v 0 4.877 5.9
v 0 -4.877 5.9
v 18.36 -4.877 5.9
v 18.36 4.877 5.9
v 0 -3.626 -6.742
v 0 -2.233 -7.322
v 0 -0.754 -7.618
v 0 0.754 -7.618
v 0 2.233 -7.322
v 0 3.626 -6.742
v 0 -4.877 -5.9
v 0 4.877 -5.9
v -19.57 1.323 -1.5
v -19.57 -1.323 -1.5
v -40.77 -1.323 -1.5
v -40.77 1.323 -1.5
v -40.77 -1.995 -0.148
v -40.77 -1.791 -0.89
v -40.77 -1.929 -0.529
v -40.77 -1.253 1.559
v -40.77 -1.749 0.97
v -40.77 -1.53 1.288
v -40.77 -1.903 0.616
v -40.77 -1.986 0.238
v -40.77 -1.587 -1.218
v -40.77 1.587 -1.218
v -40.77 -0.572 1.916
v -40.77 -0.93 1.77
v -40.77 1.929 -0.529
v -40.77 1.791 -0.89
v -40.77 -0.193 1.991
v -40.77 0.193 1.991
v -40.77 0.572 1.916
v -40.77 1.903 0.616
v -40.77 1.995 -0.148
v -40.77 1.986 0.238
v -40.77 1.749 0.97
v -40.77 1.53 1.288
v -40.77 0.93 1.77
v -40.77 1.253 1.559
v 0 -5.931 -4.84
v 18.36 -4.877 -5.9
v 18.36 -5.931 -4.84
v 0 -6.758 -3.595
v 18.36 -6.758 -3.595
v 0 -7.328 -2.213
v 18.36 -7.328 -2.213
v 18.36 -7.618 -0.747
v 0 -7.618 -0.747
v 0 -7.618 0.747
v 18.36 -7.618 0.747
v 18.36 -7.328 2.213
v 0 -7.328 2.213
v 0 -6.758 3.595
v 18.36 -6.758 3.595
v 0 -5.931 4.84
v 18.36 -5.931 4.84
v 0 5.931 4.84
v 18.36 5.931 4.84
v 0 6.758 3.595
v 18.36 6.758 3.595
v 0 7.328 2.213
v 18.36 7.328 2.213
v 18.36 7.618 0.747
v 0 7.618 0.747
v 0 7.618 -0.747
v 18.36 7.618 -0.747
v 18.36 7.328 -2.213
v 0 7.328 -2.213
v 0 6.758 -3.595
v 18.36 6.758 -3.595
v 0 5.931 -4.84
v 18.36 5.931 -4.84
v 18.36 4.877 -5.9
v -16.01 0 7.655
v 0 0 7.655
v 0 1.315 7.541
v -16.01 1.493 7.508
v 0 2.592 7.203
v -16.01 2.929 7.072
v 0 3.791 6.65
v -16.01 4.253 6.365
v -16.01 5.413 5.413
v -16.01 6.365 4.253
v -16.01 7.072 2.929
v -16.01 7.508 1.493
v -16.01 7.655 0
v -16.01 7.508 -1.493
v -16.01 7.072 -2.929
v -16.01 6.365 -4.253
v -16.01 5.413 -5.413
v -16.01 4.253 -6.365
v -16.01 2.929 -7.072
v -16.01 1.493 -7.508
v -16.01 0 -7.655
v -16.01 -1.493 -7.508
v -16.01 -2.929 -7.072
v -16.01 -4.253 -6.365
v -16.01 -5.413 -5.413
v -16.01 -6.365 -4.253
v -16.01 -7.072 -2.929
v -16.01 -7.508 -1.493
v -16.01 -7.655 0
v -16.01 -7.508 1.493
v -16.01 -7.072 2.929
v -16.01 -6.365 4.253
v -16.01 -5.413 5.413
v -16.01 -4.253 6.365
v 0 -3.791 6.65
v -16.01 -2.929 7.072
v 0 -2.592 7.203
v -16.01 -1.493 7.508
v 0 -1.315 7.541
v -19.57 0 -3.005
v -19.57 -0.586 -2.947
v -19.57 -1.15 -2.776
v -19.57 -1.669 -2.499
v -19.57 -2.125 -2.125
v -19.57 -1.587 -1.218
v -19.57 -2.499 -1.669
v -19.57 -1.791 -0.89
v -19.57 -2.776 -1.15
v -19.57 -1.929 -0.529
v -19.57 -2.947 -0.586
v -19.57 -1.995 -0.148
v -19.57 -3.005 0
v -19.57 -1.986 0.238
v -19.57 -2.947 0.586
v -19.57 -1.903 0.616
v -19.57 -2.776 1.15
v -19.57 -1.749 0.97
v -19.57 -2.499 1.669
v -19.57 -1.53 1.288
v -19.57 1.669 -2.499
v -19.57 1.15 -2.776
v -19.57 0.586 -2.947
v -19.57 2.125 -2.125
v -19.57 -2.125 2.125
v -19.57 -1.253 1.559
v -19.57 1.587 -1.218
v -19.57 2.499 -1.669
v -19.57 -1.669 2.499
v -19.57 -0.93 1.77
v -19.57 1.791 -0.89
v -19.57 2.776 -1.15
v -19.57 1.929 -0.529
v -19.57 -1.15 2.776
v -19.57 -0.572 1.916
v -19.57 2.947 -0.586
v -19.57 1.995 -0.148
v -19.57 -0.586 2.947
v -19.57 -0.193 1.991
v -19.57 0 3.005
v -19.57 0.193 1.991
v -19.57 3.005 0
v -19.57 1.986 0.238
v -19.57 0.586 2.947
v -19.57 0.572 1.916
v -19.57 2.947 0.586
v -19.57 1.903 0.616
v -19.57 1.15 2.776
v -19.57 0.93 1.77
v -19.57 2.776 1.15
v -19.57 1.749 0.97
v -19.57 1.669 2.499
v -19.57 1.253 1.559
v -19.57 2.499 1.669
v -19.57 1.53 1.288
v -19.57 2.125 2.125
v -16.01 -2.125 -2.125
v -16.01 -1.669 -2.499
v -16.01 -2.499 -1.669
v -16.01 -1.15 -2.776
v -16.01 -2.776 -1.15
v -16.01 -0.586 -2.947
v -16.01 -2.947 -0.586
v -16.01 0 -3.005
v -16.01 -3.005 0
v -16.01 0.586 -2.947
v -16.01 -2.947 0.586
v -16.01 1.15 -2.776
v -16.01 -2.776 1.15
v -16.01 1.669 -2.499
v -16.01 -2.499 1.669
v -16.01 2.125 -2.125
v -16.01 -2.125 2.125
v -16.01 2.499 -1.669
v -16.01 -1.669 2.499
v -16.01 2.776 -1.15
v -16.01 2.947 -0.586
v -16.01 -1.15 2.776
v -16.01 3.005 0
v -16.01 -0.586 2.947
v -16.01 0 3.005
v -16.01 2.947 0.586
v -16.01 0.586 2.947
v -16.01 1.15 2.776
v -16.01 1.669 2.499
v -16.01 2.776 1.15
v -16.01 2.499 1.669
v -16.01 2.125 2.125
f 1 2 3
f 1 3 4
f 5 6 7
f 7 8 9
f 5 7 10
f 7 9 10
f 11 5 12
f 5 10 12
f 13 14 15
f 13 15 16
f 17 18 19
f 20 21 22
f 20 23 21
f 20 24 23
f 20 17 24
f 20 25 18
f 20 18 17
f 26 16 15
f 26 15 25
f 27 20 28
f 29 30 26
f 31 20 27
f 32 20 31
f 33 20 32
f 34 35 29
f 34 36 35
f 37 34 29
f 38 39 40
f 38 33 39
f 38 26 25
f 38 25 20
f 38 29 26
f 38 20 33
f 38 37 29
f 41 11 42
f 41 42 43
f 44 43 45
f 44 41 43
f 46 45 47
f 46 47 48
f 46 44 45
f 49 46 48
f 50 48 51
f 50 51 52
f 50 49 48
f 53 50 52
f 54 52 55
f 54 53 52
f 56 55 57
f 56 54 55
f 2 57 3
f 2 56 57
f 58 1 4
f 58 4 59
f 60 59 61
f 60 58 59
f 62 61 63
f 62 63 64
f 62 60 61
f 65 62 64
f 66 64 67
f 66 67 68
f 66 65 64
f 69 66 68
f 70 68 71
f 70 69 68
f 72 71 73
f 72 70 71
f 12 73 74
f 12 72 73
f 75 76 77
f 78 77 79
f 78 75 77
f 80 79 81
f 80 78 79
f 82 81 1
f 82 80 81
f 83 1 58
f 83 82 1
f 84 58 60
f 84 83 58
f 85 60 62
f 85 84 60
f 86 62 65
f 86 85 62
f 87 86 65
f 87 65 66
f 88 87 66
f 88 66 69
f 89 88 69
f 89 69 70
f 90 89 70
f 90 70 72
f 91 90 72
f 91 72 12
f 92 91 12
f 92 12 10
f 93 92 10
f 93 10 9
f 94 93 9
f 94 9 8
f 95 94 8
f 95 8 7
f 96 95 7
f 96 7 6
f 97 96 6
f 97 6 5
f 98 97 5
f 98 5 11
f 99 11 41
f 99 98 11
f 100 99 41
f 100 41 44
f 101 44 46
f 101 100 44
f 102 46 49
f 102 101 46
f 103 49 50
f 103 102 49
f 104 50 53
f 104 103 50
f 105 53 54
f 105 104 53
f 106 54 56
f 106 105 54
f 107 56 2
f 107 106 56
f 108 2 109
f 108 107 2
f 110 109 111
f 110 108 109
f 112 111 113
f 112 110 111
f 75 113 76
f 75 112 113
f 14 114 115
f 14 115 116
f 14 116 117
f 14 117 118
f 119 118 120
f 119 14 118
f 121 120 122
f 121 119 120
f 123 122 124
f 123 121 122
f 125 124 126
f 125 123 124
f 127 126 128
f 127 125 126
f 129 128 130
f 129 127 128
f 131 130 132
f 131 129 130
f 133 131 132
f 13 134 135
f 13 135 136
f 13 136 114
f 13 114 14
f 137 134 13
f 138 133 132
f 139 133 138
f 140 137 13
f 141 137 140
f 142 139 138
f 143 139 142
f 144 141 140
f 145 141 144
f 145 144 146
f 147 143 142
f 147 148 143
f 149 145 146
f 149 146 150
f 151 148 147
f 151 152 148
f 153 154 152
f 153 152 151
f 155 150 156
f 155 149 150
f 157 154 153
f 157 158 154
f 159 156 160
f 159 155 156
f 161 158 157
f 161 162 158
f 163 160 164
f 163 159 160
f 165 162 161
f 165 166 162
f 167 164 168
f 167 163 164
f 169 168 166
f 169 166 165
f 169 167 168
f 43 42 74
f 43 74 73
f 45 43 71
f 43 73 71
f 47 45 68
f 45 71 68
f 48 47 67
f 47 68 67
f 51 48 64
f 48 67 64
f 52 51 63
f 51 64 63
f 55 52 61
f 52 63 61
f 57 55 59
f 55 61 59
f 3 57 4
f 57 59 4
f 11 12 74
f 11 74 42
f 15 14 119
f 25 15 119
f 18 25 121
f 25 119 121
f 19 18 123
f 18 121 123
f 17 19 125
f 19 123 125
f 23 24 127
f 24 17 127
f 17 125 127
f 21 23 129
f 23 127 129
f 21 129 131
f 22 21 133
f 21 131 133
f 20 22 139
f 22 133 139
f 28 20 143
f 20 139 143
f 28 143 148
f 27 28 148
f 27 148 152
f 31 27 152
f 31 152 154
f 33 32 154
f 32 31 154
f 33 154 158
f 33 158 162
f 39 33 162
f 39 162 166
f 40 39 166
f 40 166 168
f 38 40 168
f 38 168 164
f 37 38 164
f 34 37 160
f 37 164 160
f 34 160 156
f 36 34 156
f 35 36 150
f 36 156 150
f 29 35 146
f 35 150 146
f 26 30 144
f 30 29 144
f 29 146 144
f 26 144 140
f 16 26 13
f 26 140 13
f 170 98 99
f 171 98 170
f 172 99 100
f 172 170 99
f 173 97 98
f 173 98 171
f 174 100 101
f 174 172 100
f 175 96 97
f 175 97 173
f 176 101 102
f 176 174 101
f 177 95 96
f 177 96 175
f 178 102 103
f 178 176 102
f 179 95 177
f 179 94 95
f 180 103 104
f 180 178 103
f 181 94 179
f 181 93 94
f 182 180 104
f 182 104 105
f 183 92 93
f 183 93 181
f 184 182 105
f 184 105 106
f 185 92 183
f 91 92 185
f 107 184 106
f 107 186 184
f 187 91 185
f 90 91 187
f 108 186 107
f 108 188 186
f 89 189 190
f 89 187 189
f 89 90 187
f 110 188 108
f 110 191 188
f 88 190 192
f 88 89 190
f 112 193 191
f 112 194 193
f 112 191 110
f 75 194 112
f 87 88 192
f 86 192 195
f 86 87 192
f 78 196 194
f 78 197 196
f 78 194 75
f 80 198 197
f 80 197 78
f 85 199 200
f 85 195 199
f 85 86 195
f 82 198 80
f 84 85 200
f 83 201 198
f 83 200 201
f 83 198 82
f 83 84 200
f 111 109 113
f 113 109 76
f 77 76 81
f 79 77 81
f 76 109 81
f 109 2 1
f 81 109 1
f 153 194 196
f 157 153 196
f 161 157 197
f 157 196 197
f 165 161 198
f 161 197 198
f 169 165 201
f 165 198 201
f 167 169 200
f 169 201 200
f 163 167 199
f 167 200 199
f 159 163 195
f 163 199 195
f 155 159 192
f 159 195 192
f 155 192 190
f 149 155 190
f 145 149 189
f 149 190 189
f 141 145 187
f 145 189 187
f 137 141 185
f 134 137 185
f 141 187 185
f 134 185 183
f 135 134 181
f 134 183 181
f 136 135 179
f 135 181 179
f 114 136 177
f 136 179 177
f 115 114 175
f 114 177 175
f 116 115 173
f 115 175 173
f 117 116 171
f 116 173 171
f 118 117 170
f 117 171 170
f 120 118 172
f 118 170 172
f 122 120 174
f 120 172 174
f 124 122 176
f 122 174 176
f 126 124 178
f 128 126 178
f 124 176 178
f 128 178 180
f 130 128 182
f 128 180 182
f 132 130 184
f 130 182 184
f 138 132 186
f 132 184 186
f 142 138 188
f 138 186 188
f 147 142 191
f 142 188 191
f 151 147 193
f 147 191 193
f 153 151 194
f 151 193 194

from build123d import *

# Parameters (mm, degrees)
BOSS_EXTRUDE1_DEPTH = 18.36
BOSS_EXTRUDE2_START = 16.01
SKETCH2_R           = 7.655
BOSS_EXTRUDE2_DEPTH = 16.01
SKETCH3_R           = 3.005
BOSS_EXTRUDE3_DEPTH = 3.56
SKETCH4_R           = 2
BOSS_EXTRUDE4_DEPTH = 21.2
CUT_EXTRUDE1_START  = -21.2
CUT_EXTRUDE1_DEPTH  = 21.2


with BuildPart() as part:
    # Sketch1 → Boss-Extrude1 (new body)
    with BuildSketch(Plane(origin=(0, 0, 0), x_dir=(0, 0, -1), z_dir=(1, 0, 0))):
        with BuildLine():
            Line((-5.9, 0), (-5.9, 4.87739941))
            ThreePointArc((-5.9, 4.87739941), (0, 7.655), (5.9, 4.87739941))
            Line((5.9, 4.87739941), (5.9, 0))
            Line((5.9, 0), (5.9, -4.87739941))
            ThreePointArc((5.9, -4.87739941), (0, -7.655), (-5.9, -4.87739941))
            Line((-5.9, -4.87739941), (-5.9, 0))
        make_face()
    extrude(amount=BOSS_EXTRUDE1_DEPTH)

    # Sketch2 → Boss-Extrude2 (add)
    with BuildSketch(Plane.ZY.offset(BOSS_EXTRUDE2_START)):
        Circle(SKETCH2_R)
    extrude(amount=-BOSS_EXTRUDE2_DEPTH)

    # Sketch3 → Boss-Extrude3 (add)
    with BuildSketch(Plane.ZY.offset(16.01)):
        Circle(SKETCH3_R)
    extrude(amount=BOSS_EXTRUDE3_DEPTH)

    # Sketch4 → Boss-Extrude4 (add)
    with BuildSketch(Plane.ZY.offset(19.57)):
        Circle(SKETCH4_R)
    extrude(amount=BOSS_EXTRUDE4_DEPTH)

    # Sketch5 → Cut-Extrude1 (cut)
    with BuildSketch(Plane.ZY.offset(40.77).offset(CUT_EXTRUDE1_START)):
        with BuildLine():
            Line((-1.5, -1.322875656), (-1.5, 0))
            Line((-1.5, 0), (-1.5, 1.322875656))
            ThreePointArc((-1.5, 1.322875656), (-2, 0), (-1.5, -1.322875656))
        make_face()
    extrude(amount=CUT_EXTRUDE1_DEPTH, mode=Mode.SUBTRACT)


solid = part.part
